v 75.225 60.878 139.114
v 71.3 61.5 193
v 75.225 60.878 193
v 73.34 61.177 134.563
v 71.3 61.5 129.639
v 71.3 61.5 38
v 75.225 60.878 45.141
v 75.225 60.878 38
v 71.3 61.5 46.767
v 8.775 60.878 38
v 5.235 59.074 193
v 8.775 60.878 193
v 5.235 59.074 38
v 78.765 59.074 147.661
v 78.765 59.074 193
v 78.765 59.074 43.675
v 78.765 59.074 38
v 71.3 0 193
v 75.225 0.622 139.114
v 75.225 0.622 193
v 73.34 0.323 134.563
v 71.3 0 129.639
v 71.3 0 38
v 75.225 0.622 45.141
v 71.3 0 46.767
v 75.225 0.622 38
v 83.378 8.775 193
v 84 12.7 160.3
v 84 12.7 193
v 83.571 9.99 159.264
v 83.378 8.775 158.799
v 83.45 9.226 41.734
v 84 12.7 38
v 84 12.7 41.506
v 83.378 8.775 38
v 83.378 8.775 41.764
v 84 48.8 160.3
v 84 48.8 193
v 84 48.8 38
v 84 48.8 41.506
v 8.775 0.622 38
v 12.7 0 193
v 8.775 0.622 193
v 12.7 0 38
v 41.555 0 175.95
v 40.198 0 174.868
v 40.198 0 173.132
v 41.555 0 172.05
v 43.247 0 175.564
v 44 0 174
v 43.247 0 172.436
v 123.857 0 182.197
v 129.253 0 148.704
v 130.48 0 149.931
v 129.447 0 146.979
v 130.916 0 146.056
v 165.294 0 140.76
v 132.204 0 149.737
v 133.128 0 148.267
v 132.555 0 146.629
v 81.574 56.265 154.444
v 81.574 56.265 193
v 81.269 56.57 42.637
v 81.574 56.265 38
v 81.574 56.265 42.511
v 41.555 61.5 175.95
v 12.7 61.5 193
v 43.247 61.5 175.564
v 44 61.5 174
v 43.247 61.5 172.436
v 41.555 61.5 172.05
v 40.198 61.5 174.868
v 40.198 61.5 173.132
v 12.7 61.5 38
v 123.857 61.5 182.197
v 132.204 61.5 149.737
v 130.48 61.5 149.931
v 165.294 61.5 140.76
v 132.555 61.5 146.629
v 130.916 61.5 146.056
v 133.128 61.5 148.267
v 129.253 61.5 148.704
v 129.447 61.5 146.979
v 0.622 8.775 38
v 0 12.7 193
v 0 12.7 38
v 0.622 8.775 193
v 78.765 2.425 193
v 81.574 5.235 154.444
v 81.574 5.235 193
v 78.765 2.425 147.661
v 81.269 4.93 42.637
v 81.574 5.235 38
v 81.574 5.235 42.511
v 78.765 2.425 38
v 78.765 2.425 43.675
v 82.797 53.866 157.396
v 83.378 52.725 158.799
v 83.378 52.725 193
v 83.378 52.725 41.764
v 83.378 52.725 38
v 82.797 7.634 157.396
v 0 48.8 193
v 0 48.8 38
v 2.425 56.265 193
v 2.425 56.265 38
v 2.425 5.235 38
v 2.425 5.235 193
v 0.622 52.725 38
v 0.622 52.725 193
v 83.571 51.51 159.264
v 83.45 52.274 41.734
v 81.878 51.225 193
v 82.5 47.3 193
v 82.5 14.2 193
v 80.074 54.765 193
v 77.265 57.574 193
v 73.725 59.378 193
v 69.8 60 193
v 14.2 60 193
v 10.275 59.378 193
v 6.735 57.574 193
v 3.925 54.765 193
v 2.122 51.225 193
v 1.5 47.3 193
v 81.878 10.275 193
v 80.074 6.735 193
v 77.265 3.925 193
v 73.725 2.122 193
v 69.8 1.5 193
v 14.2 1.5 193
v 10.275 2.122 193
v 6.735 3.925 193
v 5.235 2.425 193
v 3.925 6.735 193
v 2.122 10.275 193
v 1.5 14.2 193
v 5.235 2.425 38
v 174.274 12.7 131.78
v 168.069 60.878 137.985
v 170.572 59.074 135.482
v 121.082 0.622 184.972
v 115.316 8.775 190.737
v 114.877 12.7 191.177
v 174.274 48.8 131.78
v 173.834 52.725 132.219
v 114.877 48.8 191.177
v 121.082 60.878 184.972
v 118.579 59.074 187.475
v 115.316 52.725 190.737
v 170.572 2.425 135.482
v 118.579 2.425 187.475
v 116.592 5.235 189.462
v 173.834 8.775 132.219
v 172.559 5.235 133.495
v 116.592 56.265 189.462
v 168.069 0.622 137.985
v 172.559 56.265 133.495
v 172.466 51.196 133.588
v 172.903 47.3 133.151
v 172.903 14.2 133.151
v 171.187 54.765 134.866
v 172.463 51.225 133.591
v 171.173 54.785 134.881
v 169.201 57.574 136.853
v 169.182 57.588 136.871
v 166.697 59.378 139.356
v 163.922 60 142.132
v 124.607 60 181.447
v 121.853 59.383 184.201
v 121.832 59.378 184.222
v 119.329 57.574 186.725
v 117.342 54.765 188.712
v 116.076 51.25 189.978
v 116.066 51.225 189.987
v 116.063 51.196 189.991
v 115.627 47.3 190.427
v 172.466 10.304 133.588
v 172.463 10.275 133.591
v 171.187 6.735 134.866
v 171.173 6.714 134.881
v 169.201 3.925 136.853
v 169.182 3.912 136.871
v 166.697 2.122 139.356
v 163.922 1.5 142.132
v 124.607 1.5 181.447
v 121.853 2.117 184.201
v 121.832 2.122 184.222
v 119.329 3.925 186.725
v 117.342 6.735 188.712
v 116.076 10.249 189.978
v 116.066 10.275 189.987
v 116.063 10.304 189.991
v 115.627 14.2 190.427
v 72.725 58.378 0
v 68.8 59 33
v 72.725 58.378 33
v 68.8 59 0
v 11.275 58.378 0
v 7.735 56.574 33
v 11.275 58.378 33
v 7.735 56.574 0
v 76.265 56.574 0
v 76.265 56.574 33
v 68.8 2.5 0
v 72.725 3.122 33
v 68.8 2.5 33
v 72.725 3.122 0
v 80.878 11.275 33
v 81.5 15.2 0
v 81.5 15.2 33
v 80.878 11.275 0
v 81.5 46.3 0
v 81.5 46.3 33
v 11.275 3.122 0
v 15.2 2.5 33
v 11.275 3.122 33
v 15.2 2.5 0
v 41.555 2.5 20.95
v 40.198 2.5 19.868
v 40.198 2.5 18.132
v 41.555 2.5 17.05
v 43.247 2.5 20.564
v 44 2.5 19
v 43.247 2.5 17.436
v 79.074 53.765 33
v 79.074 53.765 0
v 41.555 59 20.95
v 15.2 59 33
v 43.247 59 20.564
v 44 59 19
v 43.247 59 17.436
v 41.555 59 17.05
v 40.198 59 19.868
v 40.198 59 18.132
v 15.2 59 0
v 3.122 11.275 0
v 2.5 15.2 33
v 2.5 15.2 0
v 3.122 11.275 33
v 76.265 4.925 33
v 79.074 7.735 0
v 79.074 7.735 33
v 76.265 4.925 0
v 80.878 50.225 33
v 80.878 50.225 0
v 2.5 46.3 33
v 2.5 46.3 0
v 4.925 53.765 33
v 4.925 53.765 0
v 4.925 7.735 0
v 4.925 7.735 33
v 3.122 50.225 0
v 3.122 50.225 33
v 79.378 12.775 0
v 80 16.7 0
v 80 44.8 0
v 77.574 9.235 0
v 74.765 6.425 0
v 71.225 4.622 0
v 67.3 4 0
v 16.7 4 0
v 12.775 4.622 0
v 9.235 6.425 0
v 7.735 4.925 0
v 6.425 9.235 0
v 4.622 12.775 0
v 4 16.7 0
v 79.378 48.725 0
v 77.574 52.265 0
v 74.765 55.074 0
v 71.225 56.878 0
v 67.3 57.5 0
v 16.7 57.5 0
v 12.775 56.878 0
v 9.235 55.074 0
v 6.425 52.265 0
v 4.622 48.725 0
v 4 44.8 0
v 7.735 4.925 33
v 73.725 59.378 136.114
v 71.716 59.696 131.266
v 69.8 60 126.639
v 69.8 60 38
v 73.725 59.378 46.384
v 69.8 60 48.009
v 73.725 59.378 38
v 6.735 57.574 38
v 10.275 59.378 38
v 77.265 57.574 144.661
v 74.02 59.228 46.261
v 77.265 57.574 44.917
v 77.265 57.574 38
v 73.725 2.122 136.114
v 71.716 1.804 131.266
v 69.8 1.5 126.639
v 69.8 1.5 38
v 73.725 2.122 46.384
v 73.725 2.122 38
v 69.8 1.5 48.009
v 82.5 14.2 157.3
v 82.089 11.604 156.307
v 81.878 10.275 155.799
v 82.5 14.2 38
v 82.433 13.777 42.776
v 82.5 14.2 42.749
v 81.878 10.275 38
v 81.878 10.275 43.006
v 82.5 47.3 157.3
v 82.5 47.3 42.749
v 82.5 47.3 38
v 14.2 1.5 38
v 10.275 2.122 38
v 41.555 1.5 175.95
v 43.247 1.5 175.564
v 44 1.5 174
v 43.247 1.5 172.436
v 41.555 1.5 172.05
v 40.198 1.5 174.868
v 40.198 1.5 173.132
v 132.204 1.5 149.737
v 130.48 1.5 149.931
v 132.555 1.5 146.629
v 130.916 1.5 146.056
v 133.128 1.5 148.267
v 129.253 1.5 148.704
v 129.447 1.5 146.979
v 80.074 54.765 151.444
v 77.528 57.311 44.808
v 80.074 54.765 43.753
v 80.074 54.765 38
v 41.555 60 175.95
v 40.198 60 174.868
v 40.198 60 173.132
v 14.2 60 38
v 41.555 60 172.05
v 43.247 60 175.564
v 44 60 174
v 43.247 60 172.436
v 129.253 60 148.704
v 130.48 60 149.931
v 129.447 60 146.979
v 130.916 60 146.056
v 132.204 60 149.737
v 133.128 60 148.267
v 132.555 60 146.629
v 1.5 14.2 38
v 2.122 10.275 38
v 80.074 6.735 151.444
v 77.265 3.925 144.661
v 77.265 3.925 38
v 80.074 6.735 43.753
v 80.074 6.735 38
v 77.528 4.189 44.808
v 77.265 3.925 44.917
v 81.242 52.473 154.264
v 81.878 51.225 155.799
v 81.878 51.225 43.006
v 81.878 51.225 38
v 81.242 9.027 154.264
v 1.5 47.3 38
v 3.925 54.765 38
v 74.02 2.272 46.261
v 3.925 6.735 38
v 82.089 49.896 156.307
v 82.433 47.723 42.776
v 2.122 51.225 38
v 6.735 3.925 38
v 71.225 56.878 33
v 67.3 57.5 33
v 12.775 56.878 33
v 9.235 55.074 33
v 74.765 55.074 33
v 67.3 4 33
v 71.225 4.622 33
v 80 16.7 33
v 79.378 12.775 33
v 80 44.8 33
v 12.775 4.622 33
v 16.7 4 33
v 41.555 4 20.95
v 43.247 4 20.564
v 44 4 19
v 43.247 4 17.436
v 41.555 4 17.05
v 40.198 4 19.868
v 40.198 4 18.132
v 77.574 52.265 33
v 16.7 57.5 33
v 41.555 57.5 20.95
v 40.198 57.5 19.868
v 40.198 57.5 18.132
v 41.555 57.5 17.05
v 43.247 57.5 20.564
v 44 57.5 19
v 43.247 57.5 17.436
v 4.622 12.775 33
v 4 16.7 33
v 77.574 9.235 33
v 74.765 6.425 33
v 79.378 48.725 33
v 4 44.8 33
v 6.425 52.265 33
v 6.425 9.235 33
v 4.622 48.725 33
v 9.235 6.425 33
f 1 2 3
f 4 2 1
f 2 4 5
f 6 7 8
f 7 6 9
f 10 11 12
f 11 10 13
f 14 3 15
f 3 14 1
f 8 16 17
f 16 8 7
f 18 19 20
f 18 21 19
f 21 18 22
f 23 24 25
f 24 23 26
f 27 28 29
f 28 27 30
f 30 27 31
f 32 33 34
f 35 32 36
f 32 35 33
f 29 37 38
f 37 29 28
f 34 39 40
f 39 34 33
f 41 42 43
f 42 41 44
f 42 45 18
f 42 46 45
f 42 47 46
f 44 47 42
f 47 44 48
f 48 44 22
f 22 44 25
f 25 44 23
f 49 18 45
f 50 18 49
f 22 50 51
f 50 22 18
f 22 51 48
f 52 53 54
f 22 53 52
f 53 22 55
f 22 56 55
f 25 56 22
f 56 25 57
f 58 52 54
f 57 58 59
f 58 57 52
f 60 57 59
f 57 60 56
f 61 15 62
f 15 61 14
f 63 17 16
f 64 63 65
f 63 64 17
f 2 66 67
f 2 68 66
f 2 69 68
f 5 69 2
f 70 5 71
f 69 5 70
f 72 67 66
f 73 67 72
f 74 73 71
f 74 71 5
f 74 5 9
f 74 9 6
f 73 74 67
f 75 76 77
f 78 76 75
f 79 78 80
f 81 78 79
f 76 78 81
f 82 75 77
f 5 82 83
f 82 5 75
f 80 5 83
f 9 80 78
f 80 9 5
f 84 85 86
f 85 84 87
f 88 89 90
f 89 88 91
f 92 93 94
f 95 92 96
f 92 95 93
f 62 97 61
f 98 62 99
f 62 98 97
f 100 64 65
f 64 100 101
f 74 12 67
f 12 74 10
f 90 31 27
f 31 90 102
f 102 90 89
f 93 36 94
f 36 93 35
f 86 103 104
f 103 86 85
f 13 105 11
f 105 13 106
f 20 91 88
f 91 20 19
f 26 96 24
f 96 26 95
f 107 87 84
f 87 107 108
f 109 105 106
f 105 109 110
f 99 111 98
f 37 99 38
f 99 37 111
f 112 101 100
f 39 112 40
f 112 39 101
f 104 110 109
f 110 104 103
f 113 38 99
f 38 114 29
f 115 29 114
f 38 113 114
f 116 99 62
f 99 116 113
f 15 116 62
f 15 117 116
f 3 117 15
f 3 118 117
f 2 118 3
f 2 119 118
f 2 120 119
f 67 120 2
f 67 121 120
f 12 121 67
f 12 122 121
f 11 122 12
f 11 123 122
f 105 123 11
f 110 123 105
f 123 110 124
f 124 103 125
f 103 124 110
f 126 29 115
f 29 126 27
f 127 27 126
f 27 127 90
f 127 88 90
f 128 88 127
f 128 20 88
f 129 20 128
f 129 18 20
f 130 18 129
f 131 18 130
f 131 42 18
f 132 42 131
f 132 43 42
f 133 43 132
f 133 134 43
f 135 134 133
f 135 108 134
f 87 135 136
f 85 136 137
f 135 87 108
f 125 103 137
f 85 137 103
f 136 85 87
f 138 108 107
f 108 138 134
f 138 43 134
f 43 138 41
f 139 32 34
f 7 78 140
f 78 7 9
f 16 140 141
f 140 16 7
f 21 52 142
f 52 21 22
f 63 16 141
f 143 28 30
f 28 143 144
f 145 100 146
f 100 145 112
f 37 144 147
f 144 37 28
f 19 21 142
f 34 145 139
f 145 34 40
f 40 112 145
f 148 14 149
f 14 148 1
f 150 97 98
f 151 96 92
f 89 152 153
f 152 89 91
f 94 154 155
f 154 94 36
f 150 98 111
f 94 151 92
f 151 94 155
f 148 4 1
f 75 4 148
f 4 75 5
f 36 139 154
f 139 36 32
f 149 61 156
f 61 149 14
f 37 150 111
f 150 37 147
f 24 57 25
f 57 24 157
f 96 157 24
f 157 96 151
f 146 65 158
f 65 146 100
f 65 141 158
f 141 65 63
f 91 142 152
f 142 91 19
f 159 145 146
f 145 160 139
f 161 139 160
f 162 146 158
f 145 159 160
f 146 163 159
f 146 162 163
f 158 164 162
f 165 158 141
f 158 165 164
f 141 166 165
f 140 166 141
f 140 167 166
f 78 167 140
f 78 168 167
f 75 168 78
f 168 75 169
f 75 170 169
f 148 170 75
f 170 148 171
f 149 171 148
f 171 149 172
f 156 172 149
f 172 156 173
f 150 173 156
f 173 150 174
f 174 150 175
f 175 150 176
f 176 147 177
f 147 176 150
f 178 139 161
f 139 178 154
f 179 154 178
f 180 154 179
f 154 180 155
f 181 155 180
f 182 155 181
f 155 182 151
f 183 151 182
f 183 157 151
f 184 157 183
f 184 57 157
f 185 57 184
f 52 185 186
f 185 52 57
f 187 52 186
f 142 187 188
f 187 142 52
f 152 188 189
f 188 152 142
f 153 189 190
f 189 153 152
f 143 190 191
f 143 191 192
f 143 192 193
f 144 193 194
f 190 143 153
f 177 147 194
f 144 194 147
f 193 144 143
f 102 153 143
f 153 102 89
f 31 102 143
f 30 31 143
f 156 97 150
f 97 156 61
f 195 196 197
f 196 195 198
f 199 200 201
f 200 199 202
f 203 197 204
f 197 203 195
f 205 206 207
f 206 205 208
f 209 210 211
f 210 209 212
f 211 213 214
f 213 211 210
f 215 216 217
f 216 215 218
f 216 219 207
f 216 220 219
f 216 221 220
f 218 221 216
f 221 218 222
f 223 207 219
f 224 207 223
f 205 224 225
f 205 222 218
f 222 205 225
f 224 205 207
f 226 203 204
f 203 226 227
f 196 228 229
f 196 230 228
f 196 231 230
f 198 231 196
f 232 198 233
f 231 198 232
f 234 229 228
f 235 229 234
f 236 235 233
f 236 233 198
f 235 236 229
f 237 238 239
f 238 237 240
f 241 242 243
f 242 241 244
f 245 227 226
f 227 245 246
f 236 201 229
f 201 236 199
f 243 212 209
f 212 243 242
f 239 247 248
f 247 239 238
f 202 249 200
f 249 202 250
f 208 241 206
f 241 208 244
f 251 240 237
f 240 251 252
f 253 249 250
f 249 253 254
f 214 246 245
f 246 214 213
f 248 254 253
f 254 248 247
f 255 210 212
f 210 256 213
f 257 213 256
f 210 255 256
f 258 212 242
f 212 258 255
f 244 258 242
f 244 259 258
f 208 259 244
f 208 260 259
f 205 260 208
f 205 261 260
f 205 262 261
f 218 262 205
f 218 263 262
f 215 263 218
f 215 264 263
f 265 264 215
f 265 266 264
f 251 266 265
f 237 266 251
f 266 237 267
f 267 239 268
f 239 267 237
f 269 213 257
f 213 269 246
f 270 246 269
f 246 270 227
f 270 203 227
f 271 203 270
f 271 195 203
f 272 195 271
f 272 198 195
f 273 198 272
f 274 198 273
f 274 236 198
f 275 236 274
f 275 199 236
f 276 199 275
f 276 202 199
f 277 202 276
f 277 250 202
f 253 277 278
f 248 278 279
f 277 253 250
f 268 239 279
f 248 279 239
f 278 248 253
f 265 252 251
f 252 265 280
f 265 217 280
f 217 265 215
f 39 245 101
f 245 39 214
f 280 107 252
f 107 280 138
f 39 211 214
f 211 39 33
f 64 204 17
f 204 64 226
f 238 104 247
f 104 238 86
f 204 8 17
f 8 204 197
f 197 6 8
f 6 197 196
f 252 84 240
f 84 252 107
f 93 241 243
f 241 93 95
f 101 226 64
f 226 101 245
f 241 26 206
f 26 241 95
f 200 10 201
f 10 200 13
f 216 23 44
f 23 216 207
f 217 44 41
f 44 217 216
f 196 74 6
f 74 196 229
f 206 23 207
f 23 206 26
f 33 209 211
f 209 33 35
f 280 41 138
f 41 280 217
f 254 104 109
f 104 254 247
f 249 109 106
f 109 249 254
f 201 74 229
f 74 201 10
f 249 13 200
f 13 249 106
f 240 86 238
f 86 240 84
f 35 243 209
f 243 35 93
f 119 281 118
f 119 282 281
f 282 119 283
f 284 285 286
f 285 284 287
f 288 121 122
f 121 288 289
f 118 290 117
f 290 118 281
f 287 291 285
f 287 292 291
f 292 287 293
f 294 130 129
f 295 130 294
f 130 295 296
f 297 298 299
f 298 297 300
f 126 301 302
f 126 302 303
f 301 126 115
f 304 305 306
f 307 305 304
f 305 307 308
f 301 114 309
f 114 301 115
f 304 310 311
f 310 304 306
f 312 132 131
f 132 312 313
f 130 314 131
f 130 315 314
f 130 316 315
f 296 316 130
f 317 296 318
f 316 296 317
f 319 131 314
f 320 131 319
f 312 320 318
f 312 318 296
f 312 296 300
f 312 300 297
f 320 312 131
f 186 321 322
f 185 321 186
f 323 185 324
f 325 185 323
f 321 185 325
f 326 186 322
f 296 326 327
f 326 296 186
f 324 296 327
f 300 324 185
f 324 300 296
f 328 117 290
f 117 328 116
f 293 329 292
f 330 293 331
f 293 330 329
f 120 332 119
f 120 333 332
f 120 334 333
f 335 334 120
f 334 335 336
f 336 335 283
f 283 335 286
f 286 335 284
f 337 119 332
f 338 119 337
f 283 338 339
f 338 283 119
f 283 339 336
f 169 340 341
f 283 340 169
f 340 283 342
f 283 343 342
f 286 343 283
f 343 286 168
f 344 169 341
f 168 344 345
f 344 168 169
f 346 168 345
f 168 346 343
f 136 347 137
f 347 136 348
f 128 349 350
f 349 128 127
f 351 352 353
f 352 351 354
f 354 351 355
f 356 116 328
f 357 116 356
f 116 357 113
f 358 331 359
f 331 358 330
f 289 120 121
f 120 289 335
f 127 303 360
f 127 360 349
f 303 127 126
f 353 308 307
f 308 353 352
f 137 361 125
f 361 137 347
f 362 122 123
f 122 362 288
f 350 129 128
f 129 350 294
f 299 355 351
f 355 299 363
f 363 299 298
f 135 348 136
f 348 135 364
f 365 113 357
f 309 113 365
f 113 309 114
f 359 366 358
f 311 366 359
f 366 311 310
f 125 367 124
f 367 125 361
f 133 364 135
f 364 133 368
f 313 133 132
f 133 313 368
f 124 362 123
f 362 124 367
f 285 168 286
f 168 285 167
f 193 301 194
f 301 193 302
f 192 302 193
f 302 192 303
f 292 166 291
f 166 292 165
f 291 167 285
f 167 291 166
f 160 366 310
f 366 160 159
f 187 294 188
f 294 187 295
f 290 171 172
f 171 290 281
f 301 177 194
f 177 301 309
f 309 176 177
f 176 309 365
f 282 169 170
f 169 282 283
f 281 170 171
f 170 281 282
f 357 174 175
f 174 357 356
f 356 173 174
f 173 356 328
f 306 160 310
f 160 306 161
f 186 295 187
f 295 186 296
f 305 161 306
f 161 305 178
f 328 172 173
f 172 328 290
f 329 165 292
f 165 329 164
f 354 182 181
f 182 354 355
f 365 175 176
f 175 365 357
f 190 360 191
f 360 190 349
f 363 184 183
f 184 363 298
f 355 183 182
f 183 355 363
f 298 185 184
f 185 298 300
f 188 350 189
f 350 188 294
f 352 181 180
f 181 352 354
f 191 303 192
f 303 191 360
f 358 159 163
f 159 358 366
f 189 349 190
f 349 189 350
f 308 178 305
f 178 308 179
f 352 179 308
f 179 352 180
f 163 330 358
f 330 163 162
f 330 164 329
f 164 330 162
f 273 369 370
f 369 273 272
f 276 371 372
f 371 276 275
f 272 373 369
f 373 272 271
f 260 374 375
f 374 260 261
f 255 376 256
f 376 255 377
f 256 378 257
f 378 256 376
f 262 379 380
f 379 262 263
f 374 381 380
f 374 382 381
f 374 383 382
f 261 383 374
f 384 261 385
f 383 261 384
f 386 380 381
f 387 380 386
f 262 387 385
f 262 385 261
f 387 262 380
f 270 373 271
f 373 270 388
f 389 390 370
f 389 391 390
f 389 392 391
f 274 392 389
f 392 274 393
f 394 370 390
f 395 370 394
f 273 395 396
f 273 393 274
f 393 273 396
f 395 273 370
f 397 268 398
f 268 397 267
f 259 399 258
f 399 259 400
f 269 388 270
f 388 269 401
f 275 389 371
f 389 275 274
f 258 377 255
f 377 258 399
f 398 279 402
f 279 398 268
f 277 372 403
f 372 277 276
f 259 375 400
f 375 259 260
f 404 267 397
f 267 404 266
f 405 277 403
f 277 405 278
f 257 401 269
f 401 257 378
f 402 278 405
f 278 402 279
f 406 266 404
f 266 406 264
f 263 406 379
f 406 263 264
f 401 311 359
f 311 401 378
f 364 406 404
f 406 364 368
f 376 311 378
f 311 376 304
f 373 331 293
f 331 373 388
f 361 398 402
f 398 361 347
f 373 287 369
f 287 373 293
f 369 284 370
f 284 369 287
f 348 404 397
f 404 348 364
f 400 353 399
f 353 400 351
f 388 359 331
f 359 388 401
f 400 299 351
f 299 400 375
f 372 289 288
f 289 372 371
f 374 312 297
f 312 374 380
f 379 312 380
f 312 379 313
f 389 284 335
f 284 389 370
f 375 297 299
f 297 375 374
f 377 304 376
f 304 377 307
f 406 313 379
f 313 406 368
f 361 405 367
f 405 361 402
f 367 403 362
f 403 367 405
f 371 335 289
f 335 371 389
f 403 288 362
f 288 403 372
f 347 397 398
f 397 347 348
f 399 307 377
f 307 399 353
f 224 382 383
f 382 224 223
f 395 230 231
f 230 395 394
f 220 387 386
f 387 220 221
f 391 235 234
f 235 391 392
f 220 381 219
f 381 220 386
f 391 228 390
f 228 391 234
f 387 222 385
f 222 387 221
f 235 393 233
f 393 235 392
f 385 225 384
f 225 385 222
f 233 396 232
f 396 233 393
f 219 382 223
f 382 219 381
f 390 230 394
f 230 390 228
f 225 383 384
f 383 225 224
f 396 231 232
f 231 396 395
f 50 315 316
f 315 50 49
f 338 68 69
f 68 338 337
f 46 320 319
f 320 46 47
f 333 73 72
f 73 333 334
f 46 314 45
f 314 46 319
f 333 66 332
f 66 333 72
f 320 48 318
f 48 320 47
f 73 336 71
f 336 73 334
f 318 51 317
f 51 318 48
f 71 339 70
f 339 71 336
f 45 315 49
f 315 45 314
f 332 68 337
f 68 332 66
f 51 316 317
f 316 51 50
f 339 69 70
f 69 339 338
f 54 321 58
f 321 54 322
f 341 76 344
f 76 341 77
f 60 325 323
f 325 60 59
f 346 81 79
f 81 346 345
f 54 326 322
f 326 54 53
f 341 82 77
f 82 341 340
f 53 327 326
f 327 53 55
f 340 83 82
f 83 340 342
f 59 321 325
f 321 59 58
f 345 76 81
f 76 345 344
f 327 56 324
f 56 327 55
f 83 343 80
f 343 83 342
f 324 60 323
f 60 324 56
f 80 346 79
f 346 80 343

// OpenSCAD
// file: ../lib/utils.scad
module cone(r, angle, invert=false) {
    h = tan((180 - angle) / 2) * r;
    translate([0, 0, -h]) {
        if (invert) {
                cylinder(r1=r,r2=0,h=h, $fn=20); 
        } else {
            cylinder(r1=0,r2=r,h=h, $fn=20); 
        }
    }
}

module roundrect(vect, r, $fn=20) {
    sq = len(vect) > 1
        ? [for (i = [0:1:len(vect)-1]) vect[i] - r * 2]
        : vect - r * 2;
    minkowski() {
        square(sq);
        translate([r, r])
            circle(r=r);
    }
}

module screw(r, d, l, head, head_d, cap, angle, $fn=20) {
    radius = r > 0 ? r : d / 2;
    head_r = head > 0 ? head : head_d / 2;

    union() {
        if (angle) {
            translate([0, 0, l])
                cone(head_r, angle, false);
        }
        linear_extrude(l)
            circle(r=radius);
        if (cap > 0) {
            translate([0, 0, l - cap])
                linear_extrude(cap)
                    circle(r=head_r);
        }
    }
}

module inset_screw(r, d, l, head, head_d, cap, angle, inset, $fn=20) {
    screw_height = l - inset;
    head_r = head > 0 ? head : head_d / 2;

    union() {
        screw(
            r=r,
            d=d,
            l=screw_height,
            head=head_r,
            cap=cap,
            angle=angle,
            $fn=$fn
        );
        translate([0, 0, screw_height])
            linear_extrude(inset)
                circle(r=head_r);
    }
}

function inch_to_mm(inches) = inches * 25.4;
function increase(vec, amt) = [for (i = vec) i + amt];
// main file
// Gutter Downspout "T" Junction
// by Nathan Wittstock <nate@fardog.io>

// preview[view: south east, tilt: top diagonal]

use <../lib/utils.scad>;

/* [Downspout] */
// width of downspout opening
downspout_w = 81;
// height of downspout opening
downspout_h = 58.5;
// downspout corner radius
downspout_r = 12.7;

/* [Adapter] */
// depth of downspout inserts
insert_d = 89;
// size to reduce downspout insert
insert_allowance = 5;
// depth of outer insert
outer_d = 63.5;
// thickness of adapter
thickness = 3;

/* [Attachment] */
// diameter of screw holes
screw_d = 4;
// distance to offset screw holes from edges
screw_offset = 19.0;

/* [Hidden] */
downspout_vec = [downspout_w, downspout_h];
screw_l = downspout_h + thickness; 
total_height = insert_d + outer_d + downspout_w/2;

module roundrect(vect, r, $fn=20) {
    sq = len(vect) > 1
        ? [for (i = [0:1:len(vect)-1]) vect[i] - r * 2]
        : vect - r * 2;
    minkowski() {
        square(sq);
        translate([r, r])
            circle(r=r);
    }
}

function inch_to_mm(inches) = inches * 25.4;
function increase(vec, amt) = [for (i = vec) i + amt];

module adapt_allowance(vec) {
    hull() {
        translate([insert_allowance/2, insert_allowance/2, 0])
            linear_extrude(1) roundrect(increase(vec, -insert_allowance), downspout_r);
        translate([0, 0, insert_allowance]) linear_extrude(1) roundrect(vec, downspout_r);
    }
}

module inner(vec) {
    union() {
        difference() {
            union() {
                linear_extrude(total_height)
                    roundrect(vec, downspout_r);
                translate([downspout_r, 0, insert_d])
                    rotate([0, 45, 0])
                        linear_extrude(downspout_w + outer_d)
                            roundrect(vec, downspout_r);
            }
            linear_extrude(screw_offset*2)
                roundrect(vec, downspout_r);
        }
        linear_extrude(screw_offset*2-insert_allowance)
            translate([insert_allowance/2, insert_allowance/2, 0])
            roundrect(increase(vec, -insert_allowance), downspout_r);
        translate([0, 0, screw_offset*2-insert_allowance])
            adapt_allowance(vec);
    }
}

module screw_through() {
    rotate([-90, 0, 0])
        linear_extrude(screw_l) circle(d=screw_d, center=true);
}

module screws() {
    x = (downspout_w + thickness) / 2;
    translate([x, 0, screw_offset])
        screw_through();
    translate([x, 0, total_height - screw_offset])
        screw_through();
    translate([downspout_r, 0, insert_d])
        rotate([0, 45, 0])
            translate([x, 0, downspout_w + outer_d - screw_offset])
                screw_through();
}

difference() {
    inner(increase(downspout_vec, thickness));
    translate([thickness/2, thickness/2]) inner(downspout_vec);
    screws();
}
